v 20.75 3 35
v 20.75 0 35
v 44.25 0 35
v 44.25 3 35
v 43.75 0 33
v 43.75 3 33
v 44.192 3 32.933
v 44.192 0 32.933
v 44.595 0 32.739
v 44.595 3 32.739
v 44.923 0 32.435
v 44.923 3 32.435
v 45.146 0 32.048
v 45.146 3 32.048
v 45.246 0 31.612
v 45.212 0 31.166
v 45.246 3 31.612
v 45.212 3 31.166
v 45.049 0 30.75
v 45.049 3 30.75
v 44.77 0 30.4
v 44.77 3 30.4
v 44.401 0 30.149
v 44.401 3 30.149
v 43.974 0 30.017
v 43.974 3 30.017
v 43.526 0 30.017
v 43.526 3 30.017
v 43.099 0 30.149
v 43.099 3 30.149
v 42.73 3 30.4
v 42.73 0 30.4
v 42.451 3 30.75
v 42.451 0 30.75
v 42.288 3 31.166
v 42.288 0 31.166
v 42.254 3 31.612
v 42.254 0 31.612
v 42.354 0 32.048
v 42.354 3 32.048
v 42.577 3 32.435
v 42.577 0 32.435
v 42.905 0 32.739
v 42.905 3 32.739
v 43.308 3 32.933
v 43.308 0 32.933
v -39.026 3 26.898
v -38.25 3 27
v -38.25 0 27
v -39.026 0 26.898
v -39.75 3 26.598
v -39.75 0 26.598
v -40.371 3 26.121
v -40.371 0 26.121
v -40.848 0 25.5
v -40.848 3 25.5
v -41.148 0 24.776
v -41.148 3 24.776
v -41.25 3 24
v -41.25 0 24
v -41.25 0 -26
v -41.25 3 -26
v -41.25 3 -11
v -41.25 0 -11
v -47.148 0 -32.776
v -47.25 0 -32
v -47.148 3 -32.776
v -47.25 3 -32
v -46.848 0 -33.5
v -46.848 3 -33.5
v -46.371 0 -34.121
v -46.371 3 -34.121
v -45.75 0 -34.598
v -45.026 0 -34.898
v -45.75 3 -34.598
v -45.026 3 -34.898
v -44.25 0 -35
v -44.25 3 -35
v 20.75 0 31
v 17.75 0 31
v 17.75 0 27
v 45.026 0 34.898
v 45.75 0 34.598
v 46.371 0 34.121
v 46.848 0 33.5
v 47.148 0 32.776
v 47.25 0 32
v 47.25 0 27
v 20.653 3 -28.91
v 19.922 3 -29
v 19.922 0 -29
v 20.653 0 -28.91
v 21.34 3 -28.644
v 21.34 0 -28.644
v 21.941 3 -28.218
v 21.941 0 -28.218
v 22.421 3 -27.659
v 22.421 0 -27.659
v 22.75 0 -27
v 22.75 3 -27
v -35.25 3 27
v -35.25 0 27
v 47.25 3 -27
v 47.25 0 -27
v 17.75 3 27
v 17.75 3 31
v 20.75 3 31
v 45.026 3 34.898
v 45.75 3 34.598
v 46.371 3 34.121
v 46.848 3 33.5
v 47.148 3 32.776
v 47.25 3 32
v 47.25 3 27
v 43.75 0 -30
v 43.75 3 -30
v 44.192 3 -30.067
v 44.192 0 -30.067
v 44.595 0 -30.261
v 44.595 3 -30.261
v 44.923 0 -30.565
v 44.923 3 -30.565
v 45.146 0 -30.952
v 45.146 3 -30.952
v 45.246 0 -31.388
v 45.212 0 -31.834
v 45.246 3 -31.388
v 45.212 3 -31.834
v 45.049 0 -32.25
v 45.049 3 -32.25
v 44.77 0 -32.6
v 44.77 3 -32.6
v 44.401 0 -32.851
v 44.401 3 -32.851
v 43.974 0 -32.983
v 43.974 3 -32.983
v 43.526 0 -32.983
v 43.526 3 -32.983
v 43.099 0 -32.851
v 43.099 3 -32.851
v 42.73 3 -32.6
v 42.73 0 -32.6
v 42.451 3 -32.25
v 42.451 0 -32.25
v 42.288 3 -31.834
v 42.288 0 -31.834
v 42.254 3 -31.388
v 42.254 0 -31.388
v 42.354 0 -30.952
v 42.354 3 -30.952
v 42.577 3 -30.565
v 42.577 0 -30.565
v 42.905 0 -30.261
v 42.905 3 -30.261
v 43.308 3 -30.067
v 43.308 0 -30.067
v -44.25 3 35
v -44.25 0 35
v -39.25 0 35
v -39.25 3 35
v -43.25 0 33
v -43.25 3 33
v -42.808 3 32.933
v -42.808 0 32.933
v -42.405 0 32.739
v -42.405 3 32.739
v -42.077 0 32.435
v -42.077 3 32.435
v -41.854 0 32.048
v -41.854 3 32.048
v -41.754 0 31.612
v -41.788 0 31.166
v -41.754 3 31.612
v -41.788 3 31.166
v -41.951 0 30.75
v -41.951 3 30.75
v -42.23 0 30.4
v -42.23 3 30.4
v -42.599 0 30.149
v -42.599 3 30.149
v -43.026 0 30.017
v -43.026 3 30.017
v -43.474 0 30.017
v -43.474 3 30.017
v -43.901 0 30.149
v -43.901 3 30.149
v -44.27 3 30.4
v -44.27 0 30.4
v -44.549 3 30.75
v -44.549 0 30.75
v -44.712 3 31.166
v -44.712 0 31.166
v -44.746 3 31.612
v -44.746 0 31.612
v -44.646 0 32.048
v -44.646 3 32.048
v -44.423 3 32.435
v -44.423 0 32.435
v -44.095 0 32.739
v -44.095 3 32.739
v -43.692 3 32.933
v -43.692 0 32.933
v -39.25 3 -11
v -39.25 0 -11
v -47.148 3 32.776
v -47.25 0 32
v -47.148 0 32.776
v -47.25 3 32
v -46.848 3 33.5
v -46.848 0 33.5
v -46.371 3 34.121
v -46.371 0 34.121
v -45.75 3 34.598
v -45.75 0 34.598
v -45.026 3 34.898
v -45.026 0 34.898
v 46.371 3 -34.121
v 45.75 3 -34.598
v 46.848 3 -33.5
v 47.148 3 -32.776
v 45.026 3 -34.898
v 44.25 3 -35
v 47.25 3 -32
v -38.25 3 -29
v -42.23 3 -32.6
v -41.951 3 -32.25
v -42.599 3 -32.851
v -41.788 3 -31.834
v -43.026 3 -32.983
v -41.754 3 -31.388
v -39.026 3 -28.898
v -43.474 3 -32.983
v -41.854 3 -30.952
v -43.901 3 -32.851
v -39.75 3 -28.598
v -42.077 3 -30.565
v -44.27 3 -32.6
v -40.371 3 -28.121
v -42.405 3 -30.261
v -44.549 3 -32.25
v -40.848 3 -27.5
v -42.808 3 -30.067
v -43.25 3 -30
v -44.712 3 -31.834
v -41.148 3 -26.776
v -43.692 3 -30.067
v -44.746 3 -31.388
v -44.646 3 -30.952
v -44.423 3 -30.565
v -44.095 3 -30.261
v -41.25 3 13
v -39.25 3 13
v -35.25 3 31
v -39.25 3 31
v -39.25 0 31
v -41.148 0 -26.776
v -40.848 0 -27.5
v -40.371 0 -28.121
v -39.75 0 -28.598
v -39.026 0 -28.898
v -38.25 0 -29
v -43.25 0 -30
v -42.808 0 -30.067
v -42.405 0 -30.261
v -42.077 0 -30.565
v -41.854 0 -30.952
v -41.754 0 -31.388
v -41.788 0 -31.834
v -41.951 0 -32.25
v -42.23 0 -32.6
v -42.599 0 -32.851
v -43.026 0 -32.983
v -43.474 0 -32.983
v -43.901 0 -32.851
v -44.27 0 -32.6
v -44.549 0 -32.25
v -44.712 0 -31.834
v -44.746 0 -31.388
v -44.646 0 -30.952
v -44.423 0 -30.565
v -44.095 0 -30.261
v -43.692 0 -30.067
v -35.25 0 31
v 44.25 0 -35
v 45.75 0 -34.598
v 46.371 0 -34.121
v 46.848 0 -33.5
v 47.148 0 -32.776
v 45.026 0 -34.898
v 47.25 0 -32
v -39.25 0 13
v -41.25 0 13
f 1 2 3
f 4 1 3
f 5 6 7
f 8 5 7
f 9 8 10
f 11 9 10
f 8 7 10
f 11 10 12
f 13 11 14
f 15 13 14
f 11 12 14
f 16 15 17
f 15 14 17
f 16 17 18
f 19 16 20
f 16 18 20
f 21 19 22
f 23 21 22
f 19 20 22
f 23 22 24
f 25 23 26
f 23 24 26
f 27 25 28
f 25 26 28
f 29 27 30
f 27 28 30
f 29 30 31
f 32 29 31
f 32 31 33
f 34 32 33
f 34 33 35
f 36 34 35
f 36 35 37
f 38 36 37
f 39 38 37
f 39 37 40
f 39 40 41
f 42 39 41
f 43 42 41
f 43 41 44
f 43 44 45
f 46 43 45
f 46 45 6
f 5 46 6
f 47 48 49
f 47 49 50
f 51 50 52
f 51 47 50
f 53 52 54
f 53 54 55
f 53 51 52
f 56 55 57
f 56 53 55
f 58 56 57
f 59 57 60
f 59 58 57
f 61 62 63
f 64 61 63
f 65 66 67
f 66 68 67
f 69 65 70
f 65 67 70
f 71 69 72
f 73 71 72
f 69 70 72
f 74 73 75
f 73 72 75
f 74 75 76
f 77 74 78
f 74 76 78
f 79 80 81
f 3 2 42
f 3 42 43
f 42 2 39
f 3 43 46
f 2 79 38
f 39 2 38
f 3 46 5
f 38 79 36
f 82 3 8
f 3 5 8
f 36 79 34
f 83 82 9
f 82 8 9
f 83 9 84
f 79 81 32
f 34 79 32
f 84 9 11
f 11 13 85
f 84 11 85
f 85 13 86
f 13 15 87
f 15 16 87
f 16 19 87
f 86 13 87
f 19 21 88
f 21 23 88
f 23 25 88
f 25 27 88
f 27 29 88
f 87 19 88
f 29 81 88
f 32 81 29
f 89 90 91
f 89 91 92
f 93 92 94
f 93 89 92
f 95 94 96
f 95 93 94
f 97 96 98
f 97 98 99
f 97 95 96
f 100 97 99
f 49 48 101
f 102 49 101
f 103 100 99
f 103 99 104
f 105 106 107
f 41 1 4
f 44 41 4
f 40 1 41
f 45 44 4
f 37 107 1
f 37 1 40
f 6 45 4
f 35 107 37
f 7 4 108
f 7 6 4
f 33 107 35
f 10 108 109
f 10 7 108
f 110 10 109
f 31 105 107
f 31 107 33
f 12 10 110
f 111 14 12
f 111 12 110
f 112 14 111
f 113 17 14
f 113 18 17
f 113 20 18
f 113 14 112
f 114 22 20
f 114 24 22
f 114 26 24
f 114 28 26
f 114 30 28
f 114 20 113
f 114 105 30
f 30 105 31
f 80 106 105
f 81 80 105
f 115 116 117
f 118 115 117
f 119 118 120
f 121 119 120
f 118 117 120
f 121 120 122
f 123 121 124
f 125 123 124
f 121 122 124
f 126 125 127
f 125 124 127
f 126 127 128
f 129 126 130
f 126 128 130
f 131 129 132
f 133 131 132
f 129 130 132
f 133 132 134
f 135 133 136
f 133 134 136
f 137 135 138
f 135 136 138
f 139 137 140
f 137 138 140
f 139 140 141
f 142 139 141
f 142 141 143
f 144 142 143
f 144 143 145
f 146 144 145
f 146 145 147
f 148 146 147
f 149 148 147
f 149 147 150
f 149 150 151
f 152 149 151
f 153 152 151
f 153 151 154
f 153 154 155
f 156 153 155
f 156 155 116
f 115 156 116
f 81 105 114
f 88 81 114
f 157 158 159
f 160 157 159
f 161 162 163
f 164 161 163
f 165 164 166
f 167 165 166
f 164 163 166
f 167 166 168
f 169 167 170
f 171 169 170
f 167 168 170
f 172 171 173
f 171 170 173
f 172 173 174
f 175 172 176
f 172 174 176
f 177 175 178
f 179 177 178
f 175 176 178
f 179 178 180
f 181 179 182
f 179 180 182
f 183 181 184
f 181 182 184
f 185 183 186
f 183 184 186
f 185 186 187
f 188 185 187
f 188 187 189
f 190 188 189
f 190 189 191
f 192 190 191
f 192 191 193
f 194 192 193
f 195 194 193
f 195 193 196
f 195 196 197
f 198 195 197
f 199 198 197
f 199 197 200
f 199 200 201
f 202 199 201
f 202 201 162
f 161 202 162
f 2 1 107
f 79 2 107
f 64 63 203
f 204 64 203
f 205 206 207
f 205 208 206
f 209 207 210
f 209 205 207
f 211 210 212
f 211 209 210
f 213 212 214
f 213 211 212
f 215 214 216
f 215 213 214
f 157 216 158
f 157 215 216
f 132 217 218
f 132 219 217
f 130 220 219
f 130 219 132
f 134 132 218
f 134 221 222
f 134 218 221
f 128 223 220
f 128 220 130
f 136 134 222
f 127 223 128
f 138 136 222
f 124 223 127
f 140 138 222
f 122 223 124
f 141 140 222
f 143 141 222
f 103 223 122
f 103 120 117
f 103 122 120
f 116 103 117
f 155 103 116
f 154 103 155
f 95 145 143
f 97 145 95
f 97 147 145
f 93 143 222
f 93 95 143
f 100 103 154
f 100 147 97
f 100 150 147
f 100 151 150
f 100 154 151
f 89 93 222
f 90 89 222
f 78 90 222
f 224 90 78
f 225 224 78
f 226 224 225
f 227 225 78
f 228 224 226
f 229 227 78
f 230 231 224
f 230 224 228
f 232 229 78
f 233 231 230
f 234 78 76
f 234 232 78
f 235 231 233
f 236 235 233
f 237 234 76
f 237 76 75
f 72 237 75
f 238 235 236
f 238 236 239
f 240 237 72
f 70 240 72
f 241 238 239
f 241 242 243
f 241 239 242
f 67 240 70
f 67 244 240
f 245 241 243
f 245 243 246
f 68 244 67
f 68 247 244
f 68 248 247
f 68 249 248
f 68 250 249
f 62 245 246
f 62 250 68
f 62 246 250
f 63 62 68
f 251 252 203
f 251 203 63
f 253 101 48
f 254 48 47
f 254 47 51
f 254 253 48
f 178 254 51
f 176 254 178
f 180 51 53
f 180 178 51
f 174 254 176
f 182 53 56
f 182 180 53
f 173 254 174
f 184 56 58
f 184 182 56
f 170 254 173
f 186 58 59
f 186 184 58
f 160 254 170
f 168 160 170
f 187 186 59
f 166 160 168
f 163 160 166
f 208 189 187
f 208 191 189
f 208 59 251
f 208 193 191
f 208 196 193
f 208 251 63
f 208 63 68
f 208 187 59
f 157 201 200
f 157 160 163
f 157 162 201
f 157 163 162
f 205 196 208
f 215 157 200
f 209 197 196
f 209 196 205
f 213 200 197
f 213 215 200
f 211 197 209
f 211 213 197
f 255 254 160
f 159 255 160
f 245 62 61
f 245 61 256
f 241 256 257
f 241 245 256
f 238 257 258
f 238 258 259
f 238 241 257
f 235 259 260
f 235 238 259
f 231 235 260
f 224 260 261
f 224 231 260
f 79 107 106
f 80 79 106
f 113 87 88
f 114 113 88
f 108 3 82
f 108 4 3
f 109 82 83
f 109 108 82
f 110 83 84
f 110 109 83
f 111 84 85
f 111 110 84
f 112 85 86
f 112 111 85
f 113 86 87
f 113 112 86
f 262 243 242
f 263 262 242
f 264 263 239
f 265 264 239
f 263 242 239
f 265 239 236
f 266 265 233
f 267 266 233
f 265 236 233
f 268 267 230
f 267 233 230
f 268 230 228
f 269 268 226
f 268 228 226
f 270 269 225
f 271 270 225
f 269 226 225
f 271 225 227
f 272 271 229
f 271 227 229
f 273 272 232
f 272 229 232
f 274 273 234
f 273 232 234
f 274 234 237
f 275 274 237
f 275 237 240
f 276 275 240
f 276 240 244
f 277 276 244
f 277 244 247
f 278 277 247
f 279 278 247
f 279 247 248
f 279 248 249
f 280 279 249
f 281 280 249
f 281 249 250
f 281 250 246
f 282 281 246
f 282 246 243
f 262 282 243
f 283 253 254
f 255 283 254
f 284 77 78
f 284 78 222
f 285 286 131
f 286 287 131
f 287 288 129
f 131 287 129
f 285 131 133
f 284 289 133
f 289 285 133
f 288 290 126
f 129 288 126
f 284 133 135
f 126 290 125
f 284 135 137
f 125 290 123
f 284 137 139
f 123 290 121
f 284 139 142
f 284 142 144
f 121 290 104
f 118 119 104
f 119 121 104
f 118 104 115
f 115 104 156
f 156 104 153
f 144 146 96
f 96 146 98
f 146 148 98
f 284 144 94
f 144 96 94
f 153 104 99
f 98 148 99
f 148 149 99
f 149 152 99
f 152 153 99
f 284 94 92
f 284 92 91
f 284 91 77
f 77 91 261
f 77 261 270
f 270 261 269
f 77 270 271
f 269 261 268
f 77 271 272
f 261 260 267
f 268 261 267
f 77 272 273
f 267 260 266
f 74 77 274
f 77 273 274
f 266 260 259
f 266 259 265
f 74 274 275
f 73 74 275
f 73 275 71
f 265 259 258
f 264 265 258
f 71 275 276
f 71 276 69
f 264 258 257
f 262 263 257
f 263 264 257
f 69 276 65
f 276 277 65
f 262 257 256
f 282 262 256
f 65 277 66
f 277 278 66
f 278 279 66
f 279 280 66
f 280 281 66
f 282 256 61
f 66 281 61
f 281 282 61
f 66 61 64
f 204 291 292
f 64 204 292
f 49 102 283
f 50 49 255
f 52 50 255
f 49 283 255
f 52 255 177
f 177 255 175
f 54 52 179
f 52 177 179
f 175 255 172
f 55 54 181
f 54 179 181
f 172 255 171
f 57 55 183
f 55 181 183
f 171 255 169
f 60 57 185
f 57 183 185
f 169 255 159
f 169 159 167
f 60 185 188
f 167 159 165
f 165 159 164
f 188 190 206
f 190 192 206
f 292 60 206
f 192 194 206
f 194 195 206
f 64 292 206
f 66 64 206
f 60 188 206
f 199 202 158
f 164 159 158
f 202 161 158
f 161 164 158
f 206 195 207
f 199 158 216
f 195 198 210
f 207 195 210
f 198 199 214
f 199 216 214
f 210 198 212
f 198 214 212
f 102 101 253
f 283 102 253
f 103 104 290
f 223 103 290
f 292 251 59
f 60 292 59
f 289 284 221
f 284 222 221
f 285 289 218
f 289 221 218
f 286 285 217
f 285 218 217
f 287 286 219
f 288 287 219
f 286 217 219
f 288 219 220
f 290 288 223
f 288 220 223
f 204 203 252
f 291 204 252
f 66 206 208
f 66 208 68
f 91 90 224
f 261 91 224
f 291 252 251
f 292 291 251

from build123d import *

# Parameters (mm, degrees)
SKETCH1_W           = 94.5
SKETCH1_H           = 70
BOSS_EXTRUDE1_DEPTH = 3
SKETCH3_R           = 1.5
CUT_EXTRUDE2_DEPTH  = 59.877521177
FILLET2_R           = 3
SKETCH5_W           = 24.5
SKETCH5_H           = 54
CUT_EXTRUDE3_DEPTH  = 59.877521177
FILLET3_R           = 3


with BuildPart() as part:
    # Sketch1 → Boss-Extrude1 (new body)
    with BuildSketch(Plane(origin=(0, 0, 0), x_dir=(1, 0, 0), z_dir=(0, 1, 0))):
        Rectangle(SKETCH1_W, SKETCH1_H)
    extrude(amount=BOSS_EXTRUDE1_DEPTH)

    # Sketch3 → Cut-Extrude2 (cut, through all)
    with BuildSketch(Plane(origin=(0, 3, 0), x_dir=(1, 0, 0), z_dir=(0, 1, 0))):
        with Locations(Location((43.75, 31.5, 0), (0, 0, 270))):
            Circle(SKETCH3_R)
        with Locations(Location((-43.25, 31.5, 0), (0, 0, 270))):
            Circle(SKETCH3_R)
        with Locations(Location((-43.25, -31.5, 0), (0, 0, 270))):
            Circle(SKETCH3_R)
        with Locations(Location((43.75, -31.5, 0), (0, 0, 270))):
            Circle(SKETCH3_R)
    extrude(amount=-CUT_EXTRUDE2_DEPTH, mode=Mode.SUBTRACT)

    # Fillet2
    fillet2_edges = [part.edges().sort_by_distance(p)[0] for p in [
        (47.25, 1.5, 35),
        (-47.25, 1.5, 35),
        (-47.25, 1.5, -35),
        (47.25, 1.5, -35),
    ]]
    fillet(fillet2_edges, radius=FILLET2_R)

    # Sketch5 → Cut-Extrude3 (cut, through all)
    with BuildSketch(Plane(origin=(0, 3, 0), x_dir=(1, 0, 0), z_dir=(0, 1, 0))):
        Polygon((22.75, 29), (-41.25, 29), (-41.25, 11), (-39.25, 11), (-39.25, -13), (-41.25, -13), (-41.25, -27), (-35.25, -27), (17.75, -27), (22.75, -27), (22.75, 27), align=None)
        Polygon((17.75, -31), (17.75, -27), (-35.25, -27), (-35.25, -31), (-39.25, -31), (-39.25, -35), (20.75, -35), (20.75, -31), align=None)
        with Locations((35, 0)):
            Rectangle(SKETCH5_W, SKETCH5_H)
    extrude(amount=-CUT_EXTRUDE3_DEPTH, mode=Mode.SUBTRACT)


with BuildPart() as cut_extrude3_piece_1:
    # of the separate pieces the step leaves, piece 1, a body of its own (cut_extrude3_pieces)
    add(part.part.solids().sort_by_distance((-44.25, 0, -35))[0])

    # Fillet3
    # the kernel refuses this fillet: 3 mm, written as the material it adds along each edge
    with BuildSketch(Plane(origin=(22.75, 3, -29), x_dir=(-1, 0, 0), z_dir=(0, -1, 0))) as fillet3_piece_1:
        with BuildLine():
            CenterArc((2.828427125, -3), FILLET3_R, 90, 70.528779366)
            Line((0, -2), (-0.056568542, -1.98))
            ThreePointArc((-0.056568542, -1.98), (-0.06, -1), (-0.06, 0))
            Line((-0.06, 0), (0, 0.06))
            Line((0, 0.06), (2.828427125, 0.06))
            Line((2.828427125, 0.06), (2.828427125, 0))
        make_face()
    extrude(amount=3)
    with BuildSketch(Plane(origin=(-41.25, 3, 27), x_dir=(1, 0, 0), z_dir=(0, -1, 0)), Plane(origin=(-41.25, 3, -29), x_dir=(0, 0, 1), z_dir=(0, -1, 0))) as fillet3_piece_2:
        with BuildLine():
            CenterArc((FILLET3_R, -FILLET3_R), FILLET3_R, 90, 90)
            Line((0, -FILLET3_R), (-FILLET3_R * 0.02, -FILLET3_R))
            Line((-FILLET3_R * 0.02, -FILLET3_R), (-FILLET3_R * 0.02, FILLET3_R * 0.02))
            Line((-FILLET3_R * 0.02, FILLET3_R * 0.02), (FILLET3_R, FILLET3_R * 0.02))
            Line((FILLET3_R, FILLET3_R * 0.02), (FILLET3_R, 0))
        make_face()
    extrude(amount=3)


with BuildPart() as cut_extrude3_piece_2:
    # of the separate pieces the step leaves, piece 2, a body of its own (cut_extrude3_pieces)
    add(part.part.solids().sort_by_distance((47.25, 0, 27))[0])


solid = Compound([cut_extrude3_piece_1.part, cut_extrude3_piece_2.part])
